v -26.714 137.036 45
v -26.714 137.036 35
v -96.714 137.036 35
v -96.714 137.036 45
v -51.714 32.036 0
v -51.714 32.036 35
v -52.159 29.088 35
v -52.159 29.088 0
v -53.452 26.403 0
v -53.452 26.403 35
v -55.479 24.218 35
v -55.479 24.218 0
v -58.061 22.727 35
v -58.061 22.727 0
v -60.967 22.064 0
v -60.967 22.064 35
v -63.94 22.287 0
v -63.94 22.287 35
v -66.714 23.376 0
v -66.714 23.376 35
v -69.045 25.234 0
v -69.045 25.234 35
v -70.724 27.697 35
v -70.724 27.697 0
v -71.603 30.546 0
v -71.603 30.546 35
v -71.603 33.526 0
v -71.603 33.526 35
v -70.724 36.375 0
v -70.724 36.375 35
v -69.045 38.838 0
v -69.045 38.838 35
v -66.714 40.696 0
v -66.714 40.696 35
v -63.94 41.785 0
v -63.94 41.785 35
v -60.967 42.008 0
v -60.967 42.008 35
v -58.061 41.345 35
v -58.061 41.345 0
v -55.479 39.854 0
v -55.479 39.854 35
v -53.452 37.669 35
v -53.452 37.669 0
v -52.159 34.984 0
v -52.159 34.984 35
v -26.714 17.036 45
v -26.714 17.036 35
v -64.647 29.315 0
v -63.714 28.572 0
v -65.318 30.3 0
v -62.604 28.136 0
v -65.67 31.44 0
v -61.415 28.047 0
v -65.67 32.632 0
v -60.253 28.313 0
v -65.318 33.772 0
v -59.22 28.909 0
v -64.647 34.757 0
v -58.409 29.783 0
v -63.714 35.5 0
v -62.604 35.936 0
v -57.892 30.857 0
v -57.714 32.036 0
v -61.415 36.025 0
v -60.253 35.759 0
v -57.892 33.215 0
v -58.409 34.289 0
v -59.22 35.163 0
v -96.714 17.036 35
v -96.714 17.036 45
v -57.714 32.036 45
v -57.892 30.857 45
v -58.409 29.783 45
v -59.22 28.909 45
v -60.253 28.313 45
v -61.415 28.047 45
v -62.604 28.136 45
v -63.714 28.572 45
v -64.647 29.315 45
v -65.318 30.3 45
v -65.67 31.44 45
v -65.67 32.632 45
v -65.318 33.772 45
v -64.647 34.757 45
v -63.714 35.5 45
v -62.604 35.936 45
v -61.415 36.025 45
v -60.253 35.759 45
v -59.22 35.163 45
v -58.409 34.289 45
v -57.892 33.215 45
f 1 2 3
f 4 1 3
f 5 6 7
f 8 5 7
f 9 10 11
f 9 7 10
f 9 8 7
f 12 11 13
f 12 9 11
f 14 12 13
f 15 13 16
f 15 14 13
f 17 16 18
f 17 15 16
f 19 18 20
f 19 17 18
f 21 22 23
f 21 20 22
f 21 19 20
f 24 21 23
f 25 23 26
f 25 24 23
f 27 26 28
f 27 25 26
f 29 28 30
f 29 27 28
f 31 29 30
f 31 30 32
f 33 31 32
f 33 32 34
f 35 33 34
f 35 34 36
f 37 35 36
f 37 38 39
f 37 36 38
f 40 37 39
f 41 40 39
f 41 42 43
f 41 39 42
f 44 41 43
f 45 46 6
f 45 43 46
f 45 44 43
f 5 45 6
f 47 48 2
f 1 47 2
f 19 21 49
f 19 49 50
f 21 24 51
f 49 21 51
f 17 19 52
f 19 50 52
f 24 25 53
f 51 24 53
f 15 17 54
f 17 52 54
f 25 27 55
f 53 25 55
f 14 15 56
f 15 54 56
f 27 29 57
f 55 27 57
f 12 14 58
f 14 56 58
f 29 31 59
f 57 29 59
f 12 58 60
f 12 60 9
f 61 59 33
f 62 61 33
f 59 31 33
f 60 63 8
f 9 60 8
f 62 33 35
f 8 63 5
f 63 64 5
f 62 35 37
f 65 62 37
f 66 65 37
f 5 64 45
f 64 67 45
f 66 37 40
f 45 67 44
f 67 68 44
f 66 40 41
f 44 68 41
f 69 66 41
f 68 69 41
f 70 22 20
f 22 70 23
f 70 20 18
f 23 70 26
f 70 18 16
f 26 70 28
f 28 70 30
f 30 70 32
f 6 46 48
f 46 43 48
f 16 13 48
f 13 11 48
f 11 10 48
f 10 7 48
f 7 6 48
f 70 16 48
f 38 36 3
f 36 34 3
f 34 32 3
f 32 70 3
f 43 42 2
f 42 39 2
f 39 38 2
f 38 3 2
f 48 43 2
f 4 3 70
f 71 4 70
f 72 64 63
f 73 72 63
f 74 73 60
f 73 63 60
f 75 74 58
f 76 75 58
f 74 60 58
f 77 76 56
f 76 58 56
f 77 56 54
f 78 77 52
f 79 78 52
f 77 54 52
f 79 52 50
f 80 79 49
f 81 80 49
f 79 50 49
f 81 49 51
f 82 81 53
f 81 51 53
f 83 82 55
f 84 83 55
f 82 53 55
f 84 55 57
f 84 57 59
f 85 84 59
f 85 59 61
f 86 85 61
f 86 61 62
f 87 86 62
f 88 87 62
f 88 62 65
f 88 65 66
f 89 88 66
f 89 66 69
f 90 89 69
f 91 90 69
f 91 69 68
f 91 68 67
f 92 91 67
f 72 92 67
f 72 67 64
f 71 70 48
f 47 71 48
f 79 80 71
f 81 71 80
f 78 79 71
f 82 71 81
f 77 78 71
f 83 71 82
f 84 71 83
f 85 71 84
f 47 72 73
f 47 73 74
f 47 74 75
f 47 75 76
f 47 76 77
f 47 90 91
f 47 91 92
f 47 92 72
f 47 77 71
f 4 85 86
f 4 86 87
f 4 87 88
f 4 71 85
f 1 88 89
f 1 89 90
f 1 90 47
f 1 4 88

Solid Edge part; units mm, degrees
sketch "Sketch1" plane through (0, 0, 0) normal (0, 0, 1) x (1, 0, 0)
  circle A0 centre (-61.7143, 32.036) radius 10
extrude "Protrusion1" add sketch "Sketch1" along normal blind 35
sketch "Sketch2" plane through (-61.7143, 32.036, 35) normal (0, 0, 1) x (1, 0, 0)
  line L0 (-35, -15) -> (35, -15)
  line L1 (35, -15) -> (35, 105)
  line L2 (35, 105) -> (-35, 105)
  line L3 (-35, 105) -> (-35, -15)
  dimension "D1" = 70
  dimension "D2" = 120
  dimension "D3" = 15
extrude "ExtrudedProtrusion_2" add sketch "Sketch2" along normal blind 10
sketch "Sketch3" plane through (-61.7143, 32.036, 0) normal (0, 0, -1) x (1, 0, 0)
  circle A0 centre (0, 0) radius 4
extrude "Cutout1" cut sketch "Sketch3" against normal through all
properties material "Aluminum, 6061-T6"
